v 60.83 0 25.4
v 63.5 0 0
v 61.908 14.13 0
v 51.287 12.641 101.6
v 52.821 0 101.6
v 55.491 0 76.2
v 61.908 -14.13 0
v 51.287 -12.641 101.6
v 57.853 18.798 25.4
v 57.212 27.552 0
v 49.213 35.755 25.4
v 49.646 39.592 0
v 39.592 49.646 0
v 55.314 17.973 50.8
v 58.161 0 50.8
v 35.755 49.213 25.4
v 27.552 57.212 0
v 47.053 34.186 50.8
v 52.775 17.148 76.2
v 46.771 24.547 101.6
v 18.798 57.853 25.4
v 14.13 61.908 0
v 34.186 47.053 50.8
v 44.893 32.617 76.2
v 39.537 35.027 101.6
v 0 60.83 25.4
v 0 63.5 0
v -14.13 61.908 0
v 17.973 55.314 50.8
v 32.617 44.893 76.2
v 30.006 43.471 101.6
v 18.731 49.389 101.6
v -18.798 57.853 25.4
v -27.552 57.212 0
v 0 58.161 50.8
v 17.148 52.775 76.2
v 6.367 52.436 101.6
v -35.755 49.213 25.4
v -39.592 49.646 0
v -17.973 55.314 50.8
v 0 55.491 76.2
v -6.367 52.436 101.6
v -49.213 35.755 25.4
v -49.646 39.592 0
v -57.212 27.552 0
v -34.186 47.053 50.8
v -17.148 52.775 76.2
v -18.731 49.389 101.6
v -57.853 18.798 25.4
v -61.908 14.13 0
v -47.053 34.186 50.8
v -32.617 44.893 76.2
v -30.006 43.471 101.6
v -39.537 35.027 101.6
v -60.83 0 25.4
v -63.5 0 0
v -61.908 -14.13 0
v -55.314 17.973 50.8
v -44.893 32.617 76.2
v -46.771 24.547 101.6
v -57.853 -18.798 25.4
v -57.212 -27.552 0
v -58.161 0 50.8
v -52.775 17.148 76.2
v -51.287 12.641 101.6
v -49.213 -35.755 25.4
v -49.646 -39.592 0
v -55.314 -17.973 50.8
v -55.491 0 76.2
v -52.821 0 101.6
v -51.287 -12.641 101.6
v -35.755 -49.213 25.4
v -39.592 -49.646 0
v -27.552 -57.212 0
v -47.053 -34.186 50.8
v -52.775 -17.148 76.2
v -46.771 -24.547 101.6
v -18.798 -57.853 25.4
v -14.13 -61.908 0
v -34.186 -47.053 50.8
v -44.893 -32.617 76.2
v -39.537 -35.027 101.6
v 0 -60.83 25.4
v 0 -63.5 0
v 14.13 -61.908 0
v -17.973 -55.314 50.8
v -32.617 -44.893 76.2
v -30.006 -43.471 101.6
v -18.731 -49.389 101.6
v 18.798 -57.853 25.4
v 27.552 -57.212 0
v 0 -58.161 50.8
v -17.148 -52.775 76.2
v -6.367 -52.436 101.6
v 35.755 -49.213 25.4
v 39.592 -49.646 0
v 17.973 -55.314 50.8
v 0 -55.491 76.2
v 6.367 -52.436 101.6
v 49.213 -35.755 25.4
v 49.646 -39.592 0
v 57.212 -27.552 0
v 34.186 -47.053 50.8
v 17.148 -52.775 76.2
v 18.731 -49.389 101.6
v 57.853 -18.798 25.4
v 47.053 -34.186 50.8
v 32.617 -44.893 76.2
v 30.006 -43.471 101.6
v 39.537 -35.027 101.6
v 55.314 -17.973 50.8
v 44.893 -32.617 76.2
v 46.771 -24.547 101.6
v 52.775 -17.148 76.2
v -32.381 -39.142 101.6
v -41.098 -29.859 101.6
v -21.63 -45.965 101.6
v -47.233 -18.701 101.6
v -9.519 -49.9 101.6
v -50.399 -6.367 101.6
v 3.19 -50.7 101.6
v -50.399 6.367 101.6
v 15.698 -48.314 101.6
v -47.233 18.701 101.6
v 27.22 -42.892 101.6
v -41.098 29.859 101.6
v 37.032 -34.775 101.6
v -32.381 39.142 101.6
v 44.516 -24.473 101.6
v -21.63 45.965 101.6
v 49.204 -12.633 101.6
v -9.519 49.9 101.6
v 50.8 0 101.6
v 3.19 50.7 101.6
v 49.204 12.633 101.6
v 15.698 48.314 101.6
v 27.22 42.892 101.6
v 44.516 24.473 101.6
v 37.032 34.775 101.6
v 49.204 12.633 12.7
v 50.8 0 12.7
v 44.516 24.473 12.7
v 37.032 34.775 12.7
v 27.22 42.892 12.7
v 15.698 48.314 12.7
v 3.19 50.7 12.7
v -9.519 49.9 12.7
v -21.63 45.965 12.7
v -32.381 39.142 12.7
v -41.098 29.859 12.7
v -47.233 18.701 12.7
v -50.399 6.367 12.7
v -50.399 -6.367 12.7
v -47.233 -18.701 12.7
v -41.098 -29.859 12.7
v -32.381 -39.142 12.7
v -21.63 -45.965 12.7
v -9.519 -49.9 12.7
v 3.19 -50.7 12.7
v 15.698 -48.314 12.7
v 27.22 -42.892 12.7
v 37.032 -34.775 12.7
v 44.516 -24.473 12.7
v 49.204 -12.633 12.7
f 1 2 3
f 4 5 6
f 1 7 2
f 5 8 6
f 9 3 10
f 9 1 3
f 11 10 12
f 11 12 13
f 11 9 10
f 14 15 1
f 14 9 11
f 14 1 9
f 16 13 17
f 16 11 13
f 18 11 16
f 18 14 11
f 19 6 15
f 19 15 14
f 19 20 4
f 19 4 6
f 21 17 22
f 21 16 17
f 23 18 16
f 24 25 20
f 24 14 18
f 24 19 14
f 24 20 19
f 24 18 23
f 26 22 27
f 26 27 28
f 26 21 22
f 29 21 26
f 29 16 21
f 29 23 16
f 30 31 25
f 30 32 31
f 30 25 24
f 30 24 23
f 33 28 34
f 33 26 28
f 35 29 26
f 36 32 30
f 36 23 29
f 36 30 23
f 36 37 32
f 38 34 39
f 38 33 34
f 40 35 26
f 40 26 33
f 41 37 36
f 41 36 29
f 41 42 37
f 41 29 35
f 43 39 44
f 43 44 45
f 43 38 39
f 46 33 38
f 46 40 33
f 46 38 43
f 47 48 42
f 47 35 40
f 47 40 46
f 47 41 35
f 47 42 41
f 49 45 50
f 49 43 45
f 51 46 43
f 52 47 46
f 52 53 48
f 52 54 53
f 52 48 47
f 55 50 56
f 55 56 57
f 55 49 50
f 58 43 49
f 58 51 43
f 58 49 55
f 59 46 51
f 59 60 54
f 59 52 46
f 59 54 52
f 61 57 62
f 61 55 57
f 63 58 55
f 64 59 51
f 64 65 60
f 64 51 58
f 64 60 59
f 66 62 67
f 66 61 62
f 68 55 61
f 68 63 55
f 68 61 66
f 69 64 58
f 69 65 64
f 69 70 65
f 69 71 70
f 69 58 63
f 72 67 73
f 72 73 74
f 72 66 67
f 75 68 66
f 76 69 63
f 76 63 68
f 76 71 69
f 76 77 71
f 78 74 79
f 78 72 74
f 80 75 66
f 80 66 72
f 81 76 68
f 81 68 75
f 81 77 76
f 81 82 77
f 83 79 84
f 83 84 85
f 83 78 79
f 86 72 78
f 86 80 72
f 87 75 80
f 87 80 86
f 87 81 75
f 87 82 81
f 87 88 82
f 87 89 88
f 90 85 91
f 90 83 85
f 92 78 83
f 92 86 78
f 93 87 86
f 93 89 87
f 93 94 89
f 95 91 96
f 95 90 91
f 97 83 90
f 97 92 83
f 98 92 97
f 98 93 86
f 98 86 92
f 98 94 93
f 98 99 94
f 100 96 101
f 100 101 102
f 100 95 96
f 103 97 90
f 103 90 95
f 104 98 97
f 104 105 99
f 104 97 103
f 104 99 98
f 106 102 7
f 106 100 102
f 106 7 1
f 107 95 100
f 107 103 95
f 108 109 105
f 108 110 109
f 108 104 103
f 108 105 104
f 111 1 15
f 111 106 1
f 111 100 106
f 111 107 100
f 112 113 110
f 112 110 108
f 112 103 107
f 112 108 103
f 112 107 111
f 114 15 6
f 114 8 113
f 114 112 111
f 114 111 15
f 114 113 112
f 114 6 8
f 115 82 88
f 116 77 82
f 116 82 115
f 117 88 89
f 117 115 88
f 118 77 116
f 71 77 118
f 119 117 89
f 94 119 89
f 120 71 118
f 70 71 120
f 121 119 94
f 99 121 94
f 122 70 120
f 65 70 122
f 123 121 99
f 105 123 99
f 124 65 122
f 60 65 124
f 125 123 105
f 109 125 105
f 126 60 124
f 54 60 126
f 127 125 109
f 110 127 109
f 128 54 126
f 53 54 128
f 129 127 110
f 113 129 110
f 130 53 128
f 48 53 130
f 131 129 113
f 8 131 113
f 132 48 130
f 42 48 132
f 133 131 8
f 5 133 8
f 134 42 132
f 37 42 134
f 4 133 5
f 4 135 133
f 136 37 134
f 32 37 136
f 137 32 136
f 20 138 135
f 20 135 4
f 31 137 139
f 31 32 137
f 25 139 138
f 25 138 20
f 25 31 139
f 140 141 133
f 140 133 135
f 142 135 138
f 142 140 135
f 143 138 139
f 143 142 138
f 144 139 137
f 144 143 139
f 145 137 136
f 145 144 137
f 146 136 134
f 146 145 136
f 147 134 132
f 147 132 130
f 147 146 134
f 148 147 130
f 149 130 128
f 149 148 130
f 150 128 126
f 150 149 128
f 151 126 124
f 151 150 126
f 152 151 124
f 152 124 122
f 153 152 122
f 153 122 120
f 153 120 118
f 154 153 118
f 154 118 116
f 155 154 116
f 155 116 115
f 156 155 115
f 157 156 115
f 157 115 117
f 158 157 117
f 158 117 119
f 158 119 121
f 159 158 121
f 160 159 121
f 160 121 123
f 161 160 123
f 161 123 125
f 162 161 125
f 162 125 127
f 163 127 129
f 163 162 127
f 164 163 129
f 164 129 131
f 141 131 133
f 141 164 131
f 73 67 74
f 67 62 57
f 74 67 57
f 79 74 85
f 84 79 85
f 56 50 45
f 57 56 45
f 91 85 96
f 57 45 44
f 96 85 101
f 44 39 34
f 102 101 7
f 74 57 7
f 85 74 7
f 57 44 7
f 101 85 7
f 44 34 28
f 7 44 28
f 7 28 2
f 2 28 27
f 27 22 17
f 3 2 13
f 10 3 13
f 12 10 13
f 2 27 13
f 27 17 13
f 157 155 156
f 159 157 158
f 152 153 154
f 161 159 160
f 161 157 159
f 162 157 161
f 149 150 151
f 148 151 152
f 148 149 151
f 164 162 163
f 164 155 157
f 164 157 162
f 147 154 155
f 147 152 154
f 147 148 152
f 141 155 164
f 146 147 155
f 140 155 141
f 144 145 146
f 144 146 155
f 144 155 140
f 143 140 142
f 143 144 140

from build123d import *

# Parameters (mm, degrees)
F0_R     = 63.5
F0_R_2   = 50.8
F1_DEPTH = 101.6
F2_DEPTH = 12.7
F3_SIZE2 = 10.67858
F3_SIZE  = 101.59999


# Not quite as in the source:
# - a fillet or chamfer is up to 0.001 mm smaller than in the source, because OpenCascade refuses the exact size


with BuildPart() as f1:
    # F0 (on Top) → F1 (new body)
    with BuildSketch(Plane.XY):
        Circle(F0_R)
        Circle(F0_R_2, mode=Mode.SUBTRACT)
    extrude(amount=F1_DEPTH)

    # F0 (on Top) → F2 (join)
    with BuildSketch(Plane.XY):
        Circle(F0_R_2)
    extrude(amount=F2_DEPTH)

    # F3 (size 101.6 and 10.678590303 in the source; OpenCascade refuses exactly that, so slightly less here)
    f3_edges = [f1.edges().sort_by_distance(p)[0] for p in [
        (-63.5, 0, 101.6),
    ]]
    f3_side = f1.faces().sort_by_distance((-63.5, 0, 50.8))[0]
    chamfer(f3_edges, length=F3_SIZE, length2=F3_SIZE2, reference=f3_side)


solid = f1.part
